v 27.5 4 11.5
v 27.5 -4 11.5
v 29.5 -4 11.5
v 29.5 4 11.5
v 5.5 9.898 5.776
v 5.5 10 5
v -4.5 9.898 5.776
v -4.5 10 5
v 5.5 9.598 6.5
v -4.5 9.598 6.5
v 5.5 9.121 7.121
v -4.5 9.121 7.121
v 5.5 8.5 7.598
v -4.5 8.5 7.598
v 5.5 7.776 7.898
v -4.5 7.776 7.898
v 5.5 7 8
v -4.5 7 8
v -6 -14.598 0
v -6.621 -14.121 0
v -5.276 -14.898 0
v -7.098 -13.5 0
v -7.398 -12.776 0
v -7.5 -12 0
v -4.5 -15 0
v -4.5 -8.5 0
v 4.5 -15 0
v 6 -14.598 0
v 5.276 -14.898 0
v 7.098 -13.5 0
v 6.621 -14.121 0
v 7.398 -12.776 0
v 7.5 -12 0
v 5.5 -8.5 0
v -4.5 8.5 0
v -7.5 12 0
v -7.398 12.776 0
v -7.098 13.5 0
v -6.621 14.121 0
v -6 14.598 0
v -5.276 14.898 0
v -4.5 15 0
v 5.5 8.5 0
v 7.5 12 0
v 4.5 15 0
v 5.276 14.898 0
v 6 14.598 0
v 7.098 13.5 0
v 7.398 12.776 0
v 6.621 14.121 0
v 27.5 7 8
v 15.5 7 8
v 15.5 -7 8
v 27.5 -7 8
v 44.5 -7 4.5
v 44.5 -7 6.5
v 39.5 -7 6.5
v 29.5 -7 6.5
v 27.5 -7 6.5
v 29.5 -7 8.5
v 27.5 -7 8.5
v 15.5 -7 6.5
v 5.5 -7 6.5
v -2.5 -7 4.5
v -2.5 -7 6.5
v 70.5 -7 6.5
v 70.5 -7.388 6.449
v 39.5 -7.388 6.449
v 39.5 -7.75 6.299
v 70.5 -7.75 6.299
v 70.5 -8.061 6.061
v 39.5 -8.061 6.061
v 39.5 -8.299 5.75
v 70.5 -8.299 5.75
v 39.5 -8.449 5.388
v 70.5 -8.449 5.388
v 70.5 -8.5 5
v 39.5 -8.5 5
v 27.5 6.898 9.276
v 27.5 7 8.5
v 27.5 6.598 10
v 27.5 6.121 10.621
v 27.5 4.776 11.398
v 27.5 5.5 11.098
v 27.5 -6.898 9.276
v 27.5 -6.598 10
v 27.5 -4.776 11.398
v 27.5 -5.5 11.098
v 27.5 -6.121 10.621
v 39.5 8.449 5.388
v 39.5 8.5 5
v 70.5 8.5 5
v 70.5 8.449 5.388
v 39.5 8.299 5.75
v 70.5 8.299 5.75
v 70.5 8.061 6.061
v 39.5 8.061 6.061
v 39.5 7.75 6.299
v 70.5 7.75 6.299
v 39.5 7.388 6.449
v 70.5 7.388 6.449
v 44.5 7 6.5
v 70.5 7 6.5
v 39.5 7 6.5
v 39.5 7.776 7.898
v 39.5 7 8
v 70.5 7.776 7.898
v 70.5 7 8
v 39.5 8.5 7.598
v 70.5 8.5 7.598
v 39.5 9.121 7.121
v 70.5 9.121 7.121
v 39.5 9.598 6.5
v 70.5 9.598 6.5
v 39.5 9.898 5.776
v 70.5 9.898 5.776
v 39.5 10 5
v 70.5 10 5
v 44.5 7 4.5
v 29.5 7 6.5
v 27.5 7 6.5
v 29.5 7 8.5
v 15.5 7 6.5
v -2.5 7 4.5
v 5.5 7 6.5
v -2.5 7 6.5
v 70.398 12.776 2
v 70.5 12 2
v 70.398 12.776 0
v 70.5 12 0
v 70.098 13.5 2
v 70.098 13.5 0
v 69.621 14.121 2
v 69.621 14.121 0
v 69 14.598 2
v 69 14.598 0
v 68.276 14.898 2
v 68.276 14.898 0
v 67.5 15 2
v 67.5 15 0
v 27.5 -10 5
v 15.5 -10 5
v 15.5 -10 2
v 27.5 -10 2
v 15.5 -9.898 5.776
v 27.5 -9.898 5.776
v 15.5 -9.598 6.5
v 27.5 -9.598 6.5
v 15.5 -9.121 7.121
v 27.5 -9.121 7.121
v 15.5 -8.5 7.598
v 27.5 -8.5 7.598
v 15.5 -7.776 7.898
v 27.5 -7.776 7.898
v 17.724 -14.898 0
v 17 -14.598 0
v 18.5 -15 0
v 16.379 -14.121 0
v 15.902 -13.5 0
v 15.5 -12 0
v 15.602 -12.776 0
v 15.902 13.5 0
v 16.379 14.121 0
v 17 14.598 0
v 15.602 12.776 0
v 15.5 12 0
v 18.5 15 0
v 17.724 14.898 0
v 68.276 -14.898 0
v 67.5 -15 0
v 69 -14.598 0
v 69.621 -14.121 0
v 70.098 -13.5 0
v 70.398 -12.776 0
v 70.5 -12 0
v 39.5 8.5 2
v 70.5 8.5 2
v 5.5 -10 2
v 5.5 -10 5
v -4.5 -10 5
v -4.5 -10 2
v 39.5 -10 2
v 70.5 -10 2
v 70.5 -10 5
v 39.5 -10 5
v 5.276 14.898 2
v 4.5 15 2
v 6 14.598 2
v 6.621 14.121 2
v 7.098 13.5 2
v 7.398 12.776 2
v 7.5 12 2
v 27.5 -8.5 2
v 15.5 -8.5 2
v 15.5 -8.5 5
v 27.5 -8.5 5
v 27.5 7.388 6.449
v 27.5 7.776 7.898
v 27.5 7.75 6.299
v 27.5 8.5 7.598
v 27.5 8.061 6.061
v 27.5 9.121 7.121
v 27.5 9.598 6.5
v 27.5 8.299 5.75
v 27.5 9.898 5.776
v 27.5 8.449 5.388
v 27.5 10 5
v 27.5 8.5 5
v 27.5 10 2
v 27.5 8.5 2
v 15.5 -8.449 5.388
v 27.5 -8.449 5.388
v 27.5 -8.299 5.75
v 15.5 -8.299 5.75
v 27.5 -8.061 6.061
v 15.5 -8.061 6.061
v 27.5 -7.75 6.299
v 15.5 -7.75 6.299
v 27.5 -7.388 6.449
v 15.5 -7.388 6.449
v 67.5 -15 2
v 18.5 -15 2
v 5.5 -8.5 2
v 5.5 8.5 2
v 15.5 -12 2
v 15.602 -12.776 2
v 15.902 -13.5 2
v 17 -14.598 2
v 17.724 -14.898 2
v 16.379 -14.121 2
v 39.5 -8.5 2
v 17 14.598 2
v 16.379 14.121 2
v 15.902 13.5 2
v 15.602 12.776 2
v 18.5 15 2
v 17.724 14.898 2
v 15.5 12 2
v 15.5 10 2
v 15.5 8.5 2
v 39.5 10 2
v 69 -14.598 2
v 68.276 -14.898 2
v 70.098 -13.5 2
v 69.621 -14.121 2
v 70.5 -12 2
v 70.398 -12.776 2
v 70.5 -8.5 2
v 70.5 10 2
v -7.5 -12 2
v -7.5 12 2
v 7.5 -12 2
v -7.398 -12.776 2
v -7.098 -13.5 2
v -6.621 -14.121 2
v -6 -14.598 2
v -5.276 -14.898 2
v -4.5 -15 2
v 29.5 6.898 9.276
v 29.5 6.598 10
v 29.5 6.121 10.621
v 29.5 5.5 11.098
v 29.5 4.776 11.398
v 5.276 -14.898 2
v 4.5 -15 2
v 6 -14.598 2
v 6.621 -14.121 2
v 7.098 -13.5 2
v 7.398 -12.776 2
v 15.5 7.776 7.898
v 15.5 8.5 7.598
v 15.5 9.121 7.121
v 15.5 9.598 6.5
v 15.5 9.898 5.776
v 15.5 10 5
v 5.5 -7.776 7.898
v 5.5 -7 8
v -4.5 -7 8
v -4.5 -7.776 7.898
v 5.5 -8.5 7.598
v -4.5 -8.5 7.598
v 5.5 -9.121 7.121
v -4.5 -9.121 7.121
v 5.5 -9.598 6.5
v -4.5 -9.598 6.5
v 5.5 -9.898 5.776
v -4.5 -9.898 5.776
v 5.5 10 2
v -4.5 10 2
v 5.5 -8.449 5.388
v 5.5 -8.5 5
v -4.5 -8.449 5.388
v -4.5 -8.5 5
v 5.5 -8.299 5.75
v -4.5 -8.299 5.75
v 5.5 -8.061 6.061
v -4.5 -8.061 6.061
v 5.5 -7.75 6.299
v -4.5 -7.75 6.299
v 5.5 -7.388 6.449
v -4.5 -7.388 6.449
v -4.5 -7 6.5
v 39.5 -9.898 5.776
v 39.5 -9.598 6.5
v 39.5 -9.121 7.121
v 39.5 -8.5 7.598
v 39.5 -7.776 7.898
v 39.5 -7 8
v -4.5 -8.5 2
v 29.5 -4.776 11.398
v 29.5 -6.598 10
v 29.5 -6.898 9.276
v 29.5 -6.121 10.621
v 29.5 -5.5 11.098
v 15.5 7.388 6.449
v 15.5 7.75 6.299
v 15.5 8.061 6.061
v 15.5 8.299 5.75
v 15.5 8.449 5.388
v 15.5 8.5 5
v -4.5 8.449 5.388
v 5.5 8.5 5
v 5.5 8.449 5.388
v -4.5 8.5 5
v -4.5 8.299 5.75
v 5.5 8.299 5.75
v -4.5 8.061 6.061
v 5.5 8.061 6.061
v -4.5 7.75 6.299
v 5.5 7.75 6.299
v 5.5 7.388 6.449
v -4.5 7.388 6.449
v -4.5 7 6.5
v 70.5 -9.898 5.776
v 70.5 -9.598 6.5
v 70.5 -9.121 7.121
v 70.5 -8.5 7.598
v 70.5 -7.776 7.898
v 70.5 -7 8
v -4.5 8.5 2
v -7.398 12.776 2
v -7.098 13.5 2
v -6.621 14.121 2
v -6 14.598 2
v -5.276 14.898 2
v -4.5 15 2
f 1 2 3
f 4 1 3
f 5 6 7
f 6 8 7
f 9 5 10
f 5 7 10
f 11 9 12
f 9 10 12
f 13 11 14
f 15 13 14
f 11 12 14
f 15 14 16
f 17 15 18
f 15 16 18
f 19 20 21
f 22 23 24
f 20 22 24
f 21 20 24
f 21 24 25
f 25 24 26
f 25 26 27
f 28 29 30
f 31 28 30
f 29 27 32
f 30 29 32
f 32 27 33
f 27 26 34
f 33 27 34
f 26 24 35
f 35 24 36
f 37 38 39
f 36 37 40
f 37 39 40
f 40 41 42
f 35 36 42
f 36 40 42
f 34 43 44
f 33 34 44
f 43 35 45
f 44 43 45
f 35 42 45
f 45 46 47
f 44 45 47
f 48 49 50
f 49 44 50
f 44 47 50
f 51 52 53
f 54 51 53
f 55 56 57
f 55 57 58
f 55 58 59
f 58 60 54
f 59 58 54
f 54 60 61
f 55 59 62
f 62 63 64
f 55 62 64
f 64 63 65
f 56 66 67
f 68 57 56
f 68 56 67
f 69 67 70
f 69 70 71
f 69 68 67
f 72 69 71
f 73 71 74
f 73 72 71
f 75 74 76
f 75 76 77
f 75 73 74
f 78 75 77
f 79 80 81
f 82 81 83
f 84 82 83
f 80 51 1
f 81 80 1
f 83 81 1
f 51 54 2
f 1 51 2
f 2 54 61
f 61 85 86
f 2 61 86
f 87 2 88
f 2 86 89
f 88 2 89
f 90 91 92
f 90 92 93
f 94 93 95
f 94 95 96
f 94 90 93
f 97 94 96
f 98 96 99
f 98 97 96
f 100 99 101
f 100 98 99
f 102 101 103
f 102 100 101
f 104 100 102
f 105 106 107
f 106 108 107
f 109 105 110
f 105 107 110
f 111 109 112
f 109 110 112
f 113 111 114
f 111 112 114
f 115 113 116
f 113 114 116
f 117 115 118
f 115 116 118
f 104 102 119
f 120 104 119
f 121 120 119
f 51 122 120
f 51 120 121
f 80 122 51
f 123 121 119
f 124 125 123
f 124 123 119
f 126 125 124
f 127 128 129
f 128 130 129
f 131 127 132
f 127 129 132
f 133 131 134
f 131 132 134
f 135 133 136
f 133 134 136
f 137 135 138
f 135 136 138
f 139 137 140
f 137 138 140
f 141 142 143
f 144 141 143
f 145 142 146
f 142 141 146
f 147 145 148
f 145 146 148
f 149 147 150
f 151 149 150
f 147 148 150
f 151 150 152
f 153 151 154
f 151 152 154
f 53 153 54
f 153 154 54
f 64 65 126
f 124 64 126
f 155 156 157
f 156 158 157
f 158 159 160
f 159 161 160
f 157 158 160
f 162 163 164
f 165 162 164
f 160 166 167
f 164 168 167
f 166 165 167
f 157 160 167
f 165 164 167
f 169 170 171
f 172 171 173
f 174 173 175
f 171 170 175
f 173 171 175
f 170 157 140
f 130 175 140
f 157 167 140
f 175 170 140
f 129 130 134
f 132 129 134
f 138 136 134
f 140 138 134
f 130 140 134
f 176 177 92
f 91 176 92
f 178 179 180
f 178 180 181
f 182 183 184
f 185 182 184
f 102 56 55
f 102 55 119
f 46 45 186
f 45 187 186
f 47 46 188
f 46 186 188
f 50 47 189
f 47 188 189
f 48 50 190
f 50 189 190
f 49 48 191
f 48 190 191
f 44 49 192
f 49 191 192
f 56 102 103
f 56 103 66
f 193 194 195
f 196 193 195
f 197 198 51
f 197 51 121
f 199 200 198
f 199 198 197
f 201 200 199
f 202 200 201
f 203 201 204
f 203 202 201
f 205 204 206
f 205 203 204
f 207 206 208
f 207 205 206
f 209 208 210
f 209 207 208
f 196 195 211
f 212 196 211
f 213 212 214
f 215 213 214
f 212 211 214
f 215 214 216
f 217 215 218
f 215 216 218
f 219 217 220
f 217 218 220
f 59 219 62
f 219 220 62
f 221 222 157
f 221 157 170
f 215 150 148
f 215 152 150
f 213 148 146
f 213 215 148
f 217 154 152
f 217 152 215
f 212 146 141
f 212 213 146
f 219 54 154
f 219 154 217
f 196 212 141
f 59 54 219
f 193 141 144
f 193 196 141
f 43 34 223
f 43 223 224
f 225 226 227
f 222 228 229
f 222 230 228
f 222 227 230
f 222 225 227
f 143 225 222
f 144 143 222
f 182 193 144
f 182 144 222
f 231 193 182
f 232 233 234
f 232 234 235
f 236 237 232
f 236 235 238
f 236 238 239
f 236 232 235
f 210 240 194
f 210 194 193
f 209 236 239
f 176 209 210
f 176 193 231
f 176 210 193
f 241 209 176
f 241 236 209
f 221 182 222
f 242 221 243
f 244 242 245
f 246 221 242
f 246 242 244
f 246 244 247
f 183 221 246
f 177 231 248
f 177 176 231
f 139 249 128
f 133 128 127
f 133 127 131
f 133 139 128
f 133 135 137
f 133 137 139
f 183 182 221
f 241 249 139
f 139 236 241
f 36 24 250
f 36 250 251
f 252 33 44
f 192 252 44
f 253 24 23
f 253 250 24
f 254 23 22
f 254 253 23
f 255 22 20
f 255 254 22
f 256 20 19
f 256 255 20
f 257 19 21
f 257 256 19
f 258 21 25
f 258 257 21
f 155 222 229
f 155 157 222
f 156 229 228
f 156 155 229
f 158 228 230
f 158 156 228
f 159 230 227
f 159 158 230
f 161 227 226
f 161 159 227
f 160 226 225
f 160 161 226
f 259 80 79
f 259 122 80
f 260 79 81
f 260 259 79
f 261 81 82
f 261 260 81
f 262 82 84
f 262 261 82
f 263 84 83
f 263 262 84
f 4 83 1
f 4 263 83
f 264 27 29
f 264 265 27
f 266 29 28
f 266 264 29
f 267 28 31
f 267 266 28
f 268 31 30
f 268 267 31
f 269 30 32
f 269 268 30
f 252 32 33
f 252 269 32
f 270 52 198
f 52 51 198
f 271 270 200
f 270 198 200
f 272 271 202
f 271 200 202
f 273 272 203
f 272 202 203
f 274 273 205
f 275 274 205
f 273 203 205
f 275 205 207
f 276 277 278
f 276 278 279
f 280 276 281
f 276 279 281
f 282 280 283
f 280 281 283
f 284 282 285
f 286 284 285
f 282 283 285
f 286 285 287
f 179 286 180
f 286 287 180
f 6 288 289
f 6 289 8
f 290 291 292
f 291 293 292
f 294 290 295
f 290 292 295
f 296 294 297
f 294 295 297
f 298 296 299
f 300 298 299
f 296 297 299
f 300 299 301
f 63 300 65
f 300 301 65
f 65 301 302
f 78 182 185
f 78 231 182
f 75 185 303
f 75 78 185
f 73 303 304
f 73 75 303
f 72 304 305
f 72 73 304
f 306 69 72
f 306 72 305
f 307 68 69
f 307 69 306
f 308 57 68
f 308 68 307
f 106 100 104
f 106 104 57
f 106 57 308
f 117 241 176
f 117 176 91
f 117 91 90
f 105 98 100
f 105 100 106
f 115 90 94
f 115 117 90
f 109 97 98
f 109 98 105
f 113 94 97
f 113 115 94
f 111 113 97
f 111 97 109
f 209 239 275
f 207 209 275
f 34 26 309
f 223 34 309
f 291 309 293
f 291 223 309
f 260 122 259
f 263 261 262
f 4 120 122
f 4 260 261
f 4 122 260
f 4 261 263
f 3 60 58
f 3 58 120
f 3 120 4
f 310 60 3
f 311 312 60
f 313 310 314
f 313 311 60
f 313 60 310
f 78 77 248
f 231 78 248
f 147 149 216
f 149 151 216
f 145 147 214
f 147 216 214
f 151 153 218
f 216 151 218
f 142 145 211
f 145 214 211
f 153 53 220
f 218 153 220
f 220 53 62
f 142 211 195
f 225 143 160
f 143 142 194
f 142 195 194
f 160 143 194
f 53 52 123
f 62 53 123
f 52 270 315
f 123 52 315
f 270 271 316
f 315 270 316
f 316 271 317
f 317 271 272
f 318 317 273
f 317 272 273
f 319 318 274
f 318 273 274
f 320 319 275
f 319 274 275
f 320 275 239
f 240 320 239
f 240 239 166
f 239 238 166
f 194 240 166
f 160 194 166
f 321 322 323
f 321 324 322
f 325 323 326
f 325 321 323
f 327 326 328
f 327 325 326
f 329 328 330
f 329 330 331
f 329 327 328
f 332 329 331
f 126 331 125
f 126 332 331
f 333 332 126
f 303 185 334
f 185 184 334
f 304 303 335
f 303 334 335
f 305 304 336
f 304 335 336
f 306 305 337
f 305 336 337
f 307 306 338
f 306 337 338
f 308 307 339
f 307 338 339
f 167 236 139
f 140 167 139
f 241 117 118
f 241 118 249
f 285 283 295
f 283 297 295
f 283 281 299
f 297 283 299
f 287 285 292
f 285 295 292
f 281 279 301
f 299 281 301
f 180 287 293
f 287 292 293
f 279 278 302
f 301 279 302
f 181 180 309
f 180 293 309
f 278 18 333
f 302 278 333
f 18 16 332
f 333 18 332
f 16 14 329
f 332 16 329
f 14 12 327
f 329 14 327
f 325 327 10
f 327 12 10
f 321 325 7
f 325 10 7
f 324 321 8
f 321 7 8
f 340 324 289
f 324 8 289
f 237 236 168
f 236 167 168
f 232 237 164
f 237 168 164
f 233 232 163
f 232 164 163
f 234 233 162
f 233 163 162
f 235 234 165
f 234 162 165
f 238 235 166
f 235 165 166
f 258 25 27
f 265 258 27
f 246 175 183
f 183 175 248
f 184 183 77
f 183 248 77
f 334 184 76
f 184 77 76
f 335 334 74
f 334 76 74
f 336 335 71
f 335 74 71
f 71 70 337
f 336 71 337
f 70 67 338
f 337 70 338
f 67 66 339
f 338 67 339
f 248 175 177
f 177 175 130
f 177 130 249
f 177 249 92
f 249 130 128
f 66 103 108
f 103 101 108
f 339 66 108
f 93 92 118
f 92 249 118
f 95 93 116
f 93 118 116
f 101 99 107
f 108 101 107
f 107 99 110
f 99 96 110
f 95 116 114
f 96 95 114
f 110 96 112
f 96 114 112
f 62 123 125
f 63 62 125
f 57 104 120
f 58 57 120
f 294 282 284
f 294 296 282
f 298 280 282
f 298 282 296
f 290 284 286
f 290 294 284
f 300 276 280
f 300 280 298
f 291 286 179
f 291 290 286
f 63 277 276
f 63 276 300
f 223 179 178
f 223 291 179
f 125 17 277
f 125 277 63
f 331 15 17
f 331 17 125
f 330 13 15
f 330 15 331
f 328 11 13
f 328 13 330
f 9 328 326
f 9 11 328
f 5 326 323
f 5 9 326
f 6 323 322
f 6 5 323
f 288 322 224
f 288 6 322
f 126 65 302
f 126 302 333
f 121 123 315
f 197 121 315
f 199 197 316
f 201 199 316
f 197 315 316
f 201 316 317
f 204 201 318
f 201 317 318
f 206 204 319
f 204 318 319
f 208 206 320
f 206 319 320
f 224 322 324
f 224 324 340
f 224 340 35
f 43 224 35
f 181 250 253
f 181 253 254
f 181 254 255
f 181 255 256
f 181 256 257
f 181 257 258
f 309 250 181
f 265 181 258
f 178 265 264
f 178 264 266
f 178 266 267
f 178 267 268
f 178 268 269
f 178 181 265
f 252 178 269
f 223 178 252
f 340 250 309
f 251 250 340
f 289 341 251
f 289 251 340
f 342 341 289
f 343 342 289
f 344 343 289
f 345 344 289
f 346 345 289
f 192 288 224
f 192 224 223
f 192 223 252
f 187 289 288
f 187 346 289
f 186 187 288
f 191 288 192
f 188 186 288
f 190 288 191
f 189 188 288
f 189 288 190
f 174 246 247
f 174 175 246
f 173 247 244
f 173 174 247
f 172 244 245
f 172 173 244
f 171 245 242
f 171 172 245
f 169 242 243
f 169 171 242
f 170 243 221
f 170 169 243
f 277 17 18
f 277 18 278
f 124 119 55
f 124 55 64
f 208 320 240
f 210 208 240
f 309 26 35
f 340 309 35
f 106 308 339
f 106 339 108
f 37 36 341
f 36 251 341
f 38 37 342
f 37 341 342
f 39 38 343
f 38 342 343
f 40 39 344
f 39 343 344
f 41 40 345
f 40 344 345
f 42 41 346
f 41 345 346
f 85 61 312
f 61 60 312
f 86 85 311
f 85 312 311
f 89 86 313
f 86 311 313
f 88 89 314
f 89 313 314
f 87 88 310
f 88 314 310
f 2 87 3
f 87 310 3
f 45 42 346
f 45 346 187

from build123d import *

# Parameters (mm, degrees)
SKETCH_1_W          = 15
SKETCH_1_H          = 30
EXTRUDE_1_DEPTH     = 2
EXTRUDE_2_DEPTH     = 10
FILLET_1_R          = 1.5
SKETCH_3_W          = 10
SKETCH_3_H          = 17
CUT_EXTRUDE_1_DEPTH = 3
SKETCH_4_W          = 55
SKETCH_4_H          = 30
EXTRUDE_3_DEPTH     = 2
SKETCH_5_W          = 47
SKETCH_5_H          = 14
EXTRUDE_4_DEPTH     = 2
SKETCH_6_W          = 2
SKETCH_6_H          = 5
EXTRUDE_5_DEPTH     = 14
EXTRUDE_6_DEPTH     = 12
EXTRUDE_7_DEPTH     = 31
FILLET_4_R          = 3


with BuildPart() as part:
    # 草图1 → 凸台-拉伸1 (new body)
    with BuildSketch(Plane.XY):
        Rectangle(SKETCH_1_W, SKETCH_1_H)
    extrude(amount=EXTRUDE_1_DEPTH)

    # 草图2 → 凸台-拉伸2 (add)
    with BuildSketch(Plane(origin=(5.5, 0, 0), x_dir=(0, 0, -1), z_dir=(1, 0, 0))):
        Polygon((-2, 10), (-8, 10), (-8, -10), (-2, -10), (-2, -8.5), (-6.5, -8.5), (-6.5, 8.5), (-2, 8.5), align=None)
    extrude(amount=-EXTRUDE_2_DEPTH)

    # 圆角1
    fillet_1_edges = [part.edges().sort_by_distance(p)[0] for p in [
        (0.5, 8.5, 6.5),
        (0.5, -8.5, 6.5),
    ]]
    fillet(fillet_1_edges, radius=FILLET_1_R)

    # 草图3 → 切除-拉伸1 (cut)
    with BuildSketch(Plane(origin=(0, 0, 0), x_dir=(-1, 0, 0), z_dir=(0, 0, -1))):
        with Locations((-0.5, 0)):
            Rectangle(SKETCH_3_W, SKETCH_3_H)
    extrude(amount=-CUT_EXTRUDE_1_DEPTH, mode=Mode.SUBTRACT)

    # 草图5 → 凸台-拉伸4 (add)
    with BuildSketch(Plane(origin=(0, 0, 6.5), x_dir=(-1, 0, 0), z_dir=(0, 0, -1))):
        with Locations((-21, 0)):
            Rectangle(SKETCH_5_W, SKETCH_5_H)
    extrude(amount=EXTRUDE_4_DEPTH)

    # 草图6 → 凸台-拉伸5 (add)
    with BuildSketch(Plane.XZ.offset(7)):
        with Locations((28.5, 9)):
            Rectangle(SKETCH_6_W, SKETCH_6_H)
    extrude(amount=-EXTRUDE_5_DEPTH)



with BuildPart() as body_2:
    # 草图4 → 凸台-拉伸3 (new body)
    with BuildSketch(Plane.XY.offset(2)):
        with Locations((43, 0)):
            Rectangle(SKETCH_4_W, SKETCH_4_H)
    extrude(amount=-EXTRUDE_3_DEPTH)


with BuildPart() as part_1:
    add(part.part)

    add(body_2.part)  # 凸台-拉伸6 merges body 2
    # 草图7 → 凸台-拉伸6 (add)
    with BuildSketch(Plane.ZY.offset(-15.5)):
        with BuildLine():
            Line((6.5, -7), (6.5, 7))
            ThreePointArc((6.5, 7), (6.060660172, 8.060660172), (5, 8.5))
            Line((5, 8.5), (2, 8.5))
            Line((2, 8.5), (2, 10))
            Line((2, 10), (8, 10))
            Line((8, 10), (8, -10))
            Line((8, -10), (2, -10))
            Line((2, -10), (2, -8.5))
            Line((2, -8.5), (5, -8.5))
            ThreePointArc((5, -8.5), (6.060660172, -8.060660172), (6.5, -7))
        make_face()
    extrude(amount=-EXTRUDE_6_DEPTH)

    # 草图8 → 凸台-拉伸7 (add)
    with BuildSketch(Plane(origin=(39.5, 0, 0), x_dir=(0, 0, -1), z_dir=(1, 0, 0))):
        with BuildLine():
            Line((-6.5, 7), (-6.5, -7))
            ThreePointArc((-6.5, -7), (-6.060660172, -8.060660172), (-5, -8.5))
            Line((-5, -8.5), (-2, -8.5))
            Line((-2, -8.5), (-2, -10))
            Line((-2, -10), (-8, -10))
            Line((-8, -10), (-8, 10))
            Line((-8, 10), (-2, 10))
            Line((-2, 10), (-2, 8.5))
            Line((-2, 8.5), (-5, 8.5))
            ThreePointArc((-5, 8.5), (-6.060660172, 8.060660172), (-6.5, 7))
        make_face()
    extrude(amount=EXTRUDE_7_DEPTH)

    # 圆角4
    fillet_4_edges = [part_1.edges().sort_by_distance(p)[0] for p in [
        (-7.5, -15, 1),
        (-7.5, 15, 1),
        (7.5, 15, 1),
        (15.5, 15, 1),
        (70.5, 15, 1),
        (7.5, -15, 1),
        (15.5, -15, 1),
        (70.5, -15, 1),
        (28.5, -7, 11.5),
        (28.5, 7, 11.5),
        (55, 10, 8),
        (55, -10, 8),
        (21.5, -10, 8),
        (21.5, 10, 8),
        (0.5, -10, 8),
        (0.5, 10, 8),
    ]]
    fillet(fillet_4_edges, radius=FILLET_4_R)


solid = part_1.part
